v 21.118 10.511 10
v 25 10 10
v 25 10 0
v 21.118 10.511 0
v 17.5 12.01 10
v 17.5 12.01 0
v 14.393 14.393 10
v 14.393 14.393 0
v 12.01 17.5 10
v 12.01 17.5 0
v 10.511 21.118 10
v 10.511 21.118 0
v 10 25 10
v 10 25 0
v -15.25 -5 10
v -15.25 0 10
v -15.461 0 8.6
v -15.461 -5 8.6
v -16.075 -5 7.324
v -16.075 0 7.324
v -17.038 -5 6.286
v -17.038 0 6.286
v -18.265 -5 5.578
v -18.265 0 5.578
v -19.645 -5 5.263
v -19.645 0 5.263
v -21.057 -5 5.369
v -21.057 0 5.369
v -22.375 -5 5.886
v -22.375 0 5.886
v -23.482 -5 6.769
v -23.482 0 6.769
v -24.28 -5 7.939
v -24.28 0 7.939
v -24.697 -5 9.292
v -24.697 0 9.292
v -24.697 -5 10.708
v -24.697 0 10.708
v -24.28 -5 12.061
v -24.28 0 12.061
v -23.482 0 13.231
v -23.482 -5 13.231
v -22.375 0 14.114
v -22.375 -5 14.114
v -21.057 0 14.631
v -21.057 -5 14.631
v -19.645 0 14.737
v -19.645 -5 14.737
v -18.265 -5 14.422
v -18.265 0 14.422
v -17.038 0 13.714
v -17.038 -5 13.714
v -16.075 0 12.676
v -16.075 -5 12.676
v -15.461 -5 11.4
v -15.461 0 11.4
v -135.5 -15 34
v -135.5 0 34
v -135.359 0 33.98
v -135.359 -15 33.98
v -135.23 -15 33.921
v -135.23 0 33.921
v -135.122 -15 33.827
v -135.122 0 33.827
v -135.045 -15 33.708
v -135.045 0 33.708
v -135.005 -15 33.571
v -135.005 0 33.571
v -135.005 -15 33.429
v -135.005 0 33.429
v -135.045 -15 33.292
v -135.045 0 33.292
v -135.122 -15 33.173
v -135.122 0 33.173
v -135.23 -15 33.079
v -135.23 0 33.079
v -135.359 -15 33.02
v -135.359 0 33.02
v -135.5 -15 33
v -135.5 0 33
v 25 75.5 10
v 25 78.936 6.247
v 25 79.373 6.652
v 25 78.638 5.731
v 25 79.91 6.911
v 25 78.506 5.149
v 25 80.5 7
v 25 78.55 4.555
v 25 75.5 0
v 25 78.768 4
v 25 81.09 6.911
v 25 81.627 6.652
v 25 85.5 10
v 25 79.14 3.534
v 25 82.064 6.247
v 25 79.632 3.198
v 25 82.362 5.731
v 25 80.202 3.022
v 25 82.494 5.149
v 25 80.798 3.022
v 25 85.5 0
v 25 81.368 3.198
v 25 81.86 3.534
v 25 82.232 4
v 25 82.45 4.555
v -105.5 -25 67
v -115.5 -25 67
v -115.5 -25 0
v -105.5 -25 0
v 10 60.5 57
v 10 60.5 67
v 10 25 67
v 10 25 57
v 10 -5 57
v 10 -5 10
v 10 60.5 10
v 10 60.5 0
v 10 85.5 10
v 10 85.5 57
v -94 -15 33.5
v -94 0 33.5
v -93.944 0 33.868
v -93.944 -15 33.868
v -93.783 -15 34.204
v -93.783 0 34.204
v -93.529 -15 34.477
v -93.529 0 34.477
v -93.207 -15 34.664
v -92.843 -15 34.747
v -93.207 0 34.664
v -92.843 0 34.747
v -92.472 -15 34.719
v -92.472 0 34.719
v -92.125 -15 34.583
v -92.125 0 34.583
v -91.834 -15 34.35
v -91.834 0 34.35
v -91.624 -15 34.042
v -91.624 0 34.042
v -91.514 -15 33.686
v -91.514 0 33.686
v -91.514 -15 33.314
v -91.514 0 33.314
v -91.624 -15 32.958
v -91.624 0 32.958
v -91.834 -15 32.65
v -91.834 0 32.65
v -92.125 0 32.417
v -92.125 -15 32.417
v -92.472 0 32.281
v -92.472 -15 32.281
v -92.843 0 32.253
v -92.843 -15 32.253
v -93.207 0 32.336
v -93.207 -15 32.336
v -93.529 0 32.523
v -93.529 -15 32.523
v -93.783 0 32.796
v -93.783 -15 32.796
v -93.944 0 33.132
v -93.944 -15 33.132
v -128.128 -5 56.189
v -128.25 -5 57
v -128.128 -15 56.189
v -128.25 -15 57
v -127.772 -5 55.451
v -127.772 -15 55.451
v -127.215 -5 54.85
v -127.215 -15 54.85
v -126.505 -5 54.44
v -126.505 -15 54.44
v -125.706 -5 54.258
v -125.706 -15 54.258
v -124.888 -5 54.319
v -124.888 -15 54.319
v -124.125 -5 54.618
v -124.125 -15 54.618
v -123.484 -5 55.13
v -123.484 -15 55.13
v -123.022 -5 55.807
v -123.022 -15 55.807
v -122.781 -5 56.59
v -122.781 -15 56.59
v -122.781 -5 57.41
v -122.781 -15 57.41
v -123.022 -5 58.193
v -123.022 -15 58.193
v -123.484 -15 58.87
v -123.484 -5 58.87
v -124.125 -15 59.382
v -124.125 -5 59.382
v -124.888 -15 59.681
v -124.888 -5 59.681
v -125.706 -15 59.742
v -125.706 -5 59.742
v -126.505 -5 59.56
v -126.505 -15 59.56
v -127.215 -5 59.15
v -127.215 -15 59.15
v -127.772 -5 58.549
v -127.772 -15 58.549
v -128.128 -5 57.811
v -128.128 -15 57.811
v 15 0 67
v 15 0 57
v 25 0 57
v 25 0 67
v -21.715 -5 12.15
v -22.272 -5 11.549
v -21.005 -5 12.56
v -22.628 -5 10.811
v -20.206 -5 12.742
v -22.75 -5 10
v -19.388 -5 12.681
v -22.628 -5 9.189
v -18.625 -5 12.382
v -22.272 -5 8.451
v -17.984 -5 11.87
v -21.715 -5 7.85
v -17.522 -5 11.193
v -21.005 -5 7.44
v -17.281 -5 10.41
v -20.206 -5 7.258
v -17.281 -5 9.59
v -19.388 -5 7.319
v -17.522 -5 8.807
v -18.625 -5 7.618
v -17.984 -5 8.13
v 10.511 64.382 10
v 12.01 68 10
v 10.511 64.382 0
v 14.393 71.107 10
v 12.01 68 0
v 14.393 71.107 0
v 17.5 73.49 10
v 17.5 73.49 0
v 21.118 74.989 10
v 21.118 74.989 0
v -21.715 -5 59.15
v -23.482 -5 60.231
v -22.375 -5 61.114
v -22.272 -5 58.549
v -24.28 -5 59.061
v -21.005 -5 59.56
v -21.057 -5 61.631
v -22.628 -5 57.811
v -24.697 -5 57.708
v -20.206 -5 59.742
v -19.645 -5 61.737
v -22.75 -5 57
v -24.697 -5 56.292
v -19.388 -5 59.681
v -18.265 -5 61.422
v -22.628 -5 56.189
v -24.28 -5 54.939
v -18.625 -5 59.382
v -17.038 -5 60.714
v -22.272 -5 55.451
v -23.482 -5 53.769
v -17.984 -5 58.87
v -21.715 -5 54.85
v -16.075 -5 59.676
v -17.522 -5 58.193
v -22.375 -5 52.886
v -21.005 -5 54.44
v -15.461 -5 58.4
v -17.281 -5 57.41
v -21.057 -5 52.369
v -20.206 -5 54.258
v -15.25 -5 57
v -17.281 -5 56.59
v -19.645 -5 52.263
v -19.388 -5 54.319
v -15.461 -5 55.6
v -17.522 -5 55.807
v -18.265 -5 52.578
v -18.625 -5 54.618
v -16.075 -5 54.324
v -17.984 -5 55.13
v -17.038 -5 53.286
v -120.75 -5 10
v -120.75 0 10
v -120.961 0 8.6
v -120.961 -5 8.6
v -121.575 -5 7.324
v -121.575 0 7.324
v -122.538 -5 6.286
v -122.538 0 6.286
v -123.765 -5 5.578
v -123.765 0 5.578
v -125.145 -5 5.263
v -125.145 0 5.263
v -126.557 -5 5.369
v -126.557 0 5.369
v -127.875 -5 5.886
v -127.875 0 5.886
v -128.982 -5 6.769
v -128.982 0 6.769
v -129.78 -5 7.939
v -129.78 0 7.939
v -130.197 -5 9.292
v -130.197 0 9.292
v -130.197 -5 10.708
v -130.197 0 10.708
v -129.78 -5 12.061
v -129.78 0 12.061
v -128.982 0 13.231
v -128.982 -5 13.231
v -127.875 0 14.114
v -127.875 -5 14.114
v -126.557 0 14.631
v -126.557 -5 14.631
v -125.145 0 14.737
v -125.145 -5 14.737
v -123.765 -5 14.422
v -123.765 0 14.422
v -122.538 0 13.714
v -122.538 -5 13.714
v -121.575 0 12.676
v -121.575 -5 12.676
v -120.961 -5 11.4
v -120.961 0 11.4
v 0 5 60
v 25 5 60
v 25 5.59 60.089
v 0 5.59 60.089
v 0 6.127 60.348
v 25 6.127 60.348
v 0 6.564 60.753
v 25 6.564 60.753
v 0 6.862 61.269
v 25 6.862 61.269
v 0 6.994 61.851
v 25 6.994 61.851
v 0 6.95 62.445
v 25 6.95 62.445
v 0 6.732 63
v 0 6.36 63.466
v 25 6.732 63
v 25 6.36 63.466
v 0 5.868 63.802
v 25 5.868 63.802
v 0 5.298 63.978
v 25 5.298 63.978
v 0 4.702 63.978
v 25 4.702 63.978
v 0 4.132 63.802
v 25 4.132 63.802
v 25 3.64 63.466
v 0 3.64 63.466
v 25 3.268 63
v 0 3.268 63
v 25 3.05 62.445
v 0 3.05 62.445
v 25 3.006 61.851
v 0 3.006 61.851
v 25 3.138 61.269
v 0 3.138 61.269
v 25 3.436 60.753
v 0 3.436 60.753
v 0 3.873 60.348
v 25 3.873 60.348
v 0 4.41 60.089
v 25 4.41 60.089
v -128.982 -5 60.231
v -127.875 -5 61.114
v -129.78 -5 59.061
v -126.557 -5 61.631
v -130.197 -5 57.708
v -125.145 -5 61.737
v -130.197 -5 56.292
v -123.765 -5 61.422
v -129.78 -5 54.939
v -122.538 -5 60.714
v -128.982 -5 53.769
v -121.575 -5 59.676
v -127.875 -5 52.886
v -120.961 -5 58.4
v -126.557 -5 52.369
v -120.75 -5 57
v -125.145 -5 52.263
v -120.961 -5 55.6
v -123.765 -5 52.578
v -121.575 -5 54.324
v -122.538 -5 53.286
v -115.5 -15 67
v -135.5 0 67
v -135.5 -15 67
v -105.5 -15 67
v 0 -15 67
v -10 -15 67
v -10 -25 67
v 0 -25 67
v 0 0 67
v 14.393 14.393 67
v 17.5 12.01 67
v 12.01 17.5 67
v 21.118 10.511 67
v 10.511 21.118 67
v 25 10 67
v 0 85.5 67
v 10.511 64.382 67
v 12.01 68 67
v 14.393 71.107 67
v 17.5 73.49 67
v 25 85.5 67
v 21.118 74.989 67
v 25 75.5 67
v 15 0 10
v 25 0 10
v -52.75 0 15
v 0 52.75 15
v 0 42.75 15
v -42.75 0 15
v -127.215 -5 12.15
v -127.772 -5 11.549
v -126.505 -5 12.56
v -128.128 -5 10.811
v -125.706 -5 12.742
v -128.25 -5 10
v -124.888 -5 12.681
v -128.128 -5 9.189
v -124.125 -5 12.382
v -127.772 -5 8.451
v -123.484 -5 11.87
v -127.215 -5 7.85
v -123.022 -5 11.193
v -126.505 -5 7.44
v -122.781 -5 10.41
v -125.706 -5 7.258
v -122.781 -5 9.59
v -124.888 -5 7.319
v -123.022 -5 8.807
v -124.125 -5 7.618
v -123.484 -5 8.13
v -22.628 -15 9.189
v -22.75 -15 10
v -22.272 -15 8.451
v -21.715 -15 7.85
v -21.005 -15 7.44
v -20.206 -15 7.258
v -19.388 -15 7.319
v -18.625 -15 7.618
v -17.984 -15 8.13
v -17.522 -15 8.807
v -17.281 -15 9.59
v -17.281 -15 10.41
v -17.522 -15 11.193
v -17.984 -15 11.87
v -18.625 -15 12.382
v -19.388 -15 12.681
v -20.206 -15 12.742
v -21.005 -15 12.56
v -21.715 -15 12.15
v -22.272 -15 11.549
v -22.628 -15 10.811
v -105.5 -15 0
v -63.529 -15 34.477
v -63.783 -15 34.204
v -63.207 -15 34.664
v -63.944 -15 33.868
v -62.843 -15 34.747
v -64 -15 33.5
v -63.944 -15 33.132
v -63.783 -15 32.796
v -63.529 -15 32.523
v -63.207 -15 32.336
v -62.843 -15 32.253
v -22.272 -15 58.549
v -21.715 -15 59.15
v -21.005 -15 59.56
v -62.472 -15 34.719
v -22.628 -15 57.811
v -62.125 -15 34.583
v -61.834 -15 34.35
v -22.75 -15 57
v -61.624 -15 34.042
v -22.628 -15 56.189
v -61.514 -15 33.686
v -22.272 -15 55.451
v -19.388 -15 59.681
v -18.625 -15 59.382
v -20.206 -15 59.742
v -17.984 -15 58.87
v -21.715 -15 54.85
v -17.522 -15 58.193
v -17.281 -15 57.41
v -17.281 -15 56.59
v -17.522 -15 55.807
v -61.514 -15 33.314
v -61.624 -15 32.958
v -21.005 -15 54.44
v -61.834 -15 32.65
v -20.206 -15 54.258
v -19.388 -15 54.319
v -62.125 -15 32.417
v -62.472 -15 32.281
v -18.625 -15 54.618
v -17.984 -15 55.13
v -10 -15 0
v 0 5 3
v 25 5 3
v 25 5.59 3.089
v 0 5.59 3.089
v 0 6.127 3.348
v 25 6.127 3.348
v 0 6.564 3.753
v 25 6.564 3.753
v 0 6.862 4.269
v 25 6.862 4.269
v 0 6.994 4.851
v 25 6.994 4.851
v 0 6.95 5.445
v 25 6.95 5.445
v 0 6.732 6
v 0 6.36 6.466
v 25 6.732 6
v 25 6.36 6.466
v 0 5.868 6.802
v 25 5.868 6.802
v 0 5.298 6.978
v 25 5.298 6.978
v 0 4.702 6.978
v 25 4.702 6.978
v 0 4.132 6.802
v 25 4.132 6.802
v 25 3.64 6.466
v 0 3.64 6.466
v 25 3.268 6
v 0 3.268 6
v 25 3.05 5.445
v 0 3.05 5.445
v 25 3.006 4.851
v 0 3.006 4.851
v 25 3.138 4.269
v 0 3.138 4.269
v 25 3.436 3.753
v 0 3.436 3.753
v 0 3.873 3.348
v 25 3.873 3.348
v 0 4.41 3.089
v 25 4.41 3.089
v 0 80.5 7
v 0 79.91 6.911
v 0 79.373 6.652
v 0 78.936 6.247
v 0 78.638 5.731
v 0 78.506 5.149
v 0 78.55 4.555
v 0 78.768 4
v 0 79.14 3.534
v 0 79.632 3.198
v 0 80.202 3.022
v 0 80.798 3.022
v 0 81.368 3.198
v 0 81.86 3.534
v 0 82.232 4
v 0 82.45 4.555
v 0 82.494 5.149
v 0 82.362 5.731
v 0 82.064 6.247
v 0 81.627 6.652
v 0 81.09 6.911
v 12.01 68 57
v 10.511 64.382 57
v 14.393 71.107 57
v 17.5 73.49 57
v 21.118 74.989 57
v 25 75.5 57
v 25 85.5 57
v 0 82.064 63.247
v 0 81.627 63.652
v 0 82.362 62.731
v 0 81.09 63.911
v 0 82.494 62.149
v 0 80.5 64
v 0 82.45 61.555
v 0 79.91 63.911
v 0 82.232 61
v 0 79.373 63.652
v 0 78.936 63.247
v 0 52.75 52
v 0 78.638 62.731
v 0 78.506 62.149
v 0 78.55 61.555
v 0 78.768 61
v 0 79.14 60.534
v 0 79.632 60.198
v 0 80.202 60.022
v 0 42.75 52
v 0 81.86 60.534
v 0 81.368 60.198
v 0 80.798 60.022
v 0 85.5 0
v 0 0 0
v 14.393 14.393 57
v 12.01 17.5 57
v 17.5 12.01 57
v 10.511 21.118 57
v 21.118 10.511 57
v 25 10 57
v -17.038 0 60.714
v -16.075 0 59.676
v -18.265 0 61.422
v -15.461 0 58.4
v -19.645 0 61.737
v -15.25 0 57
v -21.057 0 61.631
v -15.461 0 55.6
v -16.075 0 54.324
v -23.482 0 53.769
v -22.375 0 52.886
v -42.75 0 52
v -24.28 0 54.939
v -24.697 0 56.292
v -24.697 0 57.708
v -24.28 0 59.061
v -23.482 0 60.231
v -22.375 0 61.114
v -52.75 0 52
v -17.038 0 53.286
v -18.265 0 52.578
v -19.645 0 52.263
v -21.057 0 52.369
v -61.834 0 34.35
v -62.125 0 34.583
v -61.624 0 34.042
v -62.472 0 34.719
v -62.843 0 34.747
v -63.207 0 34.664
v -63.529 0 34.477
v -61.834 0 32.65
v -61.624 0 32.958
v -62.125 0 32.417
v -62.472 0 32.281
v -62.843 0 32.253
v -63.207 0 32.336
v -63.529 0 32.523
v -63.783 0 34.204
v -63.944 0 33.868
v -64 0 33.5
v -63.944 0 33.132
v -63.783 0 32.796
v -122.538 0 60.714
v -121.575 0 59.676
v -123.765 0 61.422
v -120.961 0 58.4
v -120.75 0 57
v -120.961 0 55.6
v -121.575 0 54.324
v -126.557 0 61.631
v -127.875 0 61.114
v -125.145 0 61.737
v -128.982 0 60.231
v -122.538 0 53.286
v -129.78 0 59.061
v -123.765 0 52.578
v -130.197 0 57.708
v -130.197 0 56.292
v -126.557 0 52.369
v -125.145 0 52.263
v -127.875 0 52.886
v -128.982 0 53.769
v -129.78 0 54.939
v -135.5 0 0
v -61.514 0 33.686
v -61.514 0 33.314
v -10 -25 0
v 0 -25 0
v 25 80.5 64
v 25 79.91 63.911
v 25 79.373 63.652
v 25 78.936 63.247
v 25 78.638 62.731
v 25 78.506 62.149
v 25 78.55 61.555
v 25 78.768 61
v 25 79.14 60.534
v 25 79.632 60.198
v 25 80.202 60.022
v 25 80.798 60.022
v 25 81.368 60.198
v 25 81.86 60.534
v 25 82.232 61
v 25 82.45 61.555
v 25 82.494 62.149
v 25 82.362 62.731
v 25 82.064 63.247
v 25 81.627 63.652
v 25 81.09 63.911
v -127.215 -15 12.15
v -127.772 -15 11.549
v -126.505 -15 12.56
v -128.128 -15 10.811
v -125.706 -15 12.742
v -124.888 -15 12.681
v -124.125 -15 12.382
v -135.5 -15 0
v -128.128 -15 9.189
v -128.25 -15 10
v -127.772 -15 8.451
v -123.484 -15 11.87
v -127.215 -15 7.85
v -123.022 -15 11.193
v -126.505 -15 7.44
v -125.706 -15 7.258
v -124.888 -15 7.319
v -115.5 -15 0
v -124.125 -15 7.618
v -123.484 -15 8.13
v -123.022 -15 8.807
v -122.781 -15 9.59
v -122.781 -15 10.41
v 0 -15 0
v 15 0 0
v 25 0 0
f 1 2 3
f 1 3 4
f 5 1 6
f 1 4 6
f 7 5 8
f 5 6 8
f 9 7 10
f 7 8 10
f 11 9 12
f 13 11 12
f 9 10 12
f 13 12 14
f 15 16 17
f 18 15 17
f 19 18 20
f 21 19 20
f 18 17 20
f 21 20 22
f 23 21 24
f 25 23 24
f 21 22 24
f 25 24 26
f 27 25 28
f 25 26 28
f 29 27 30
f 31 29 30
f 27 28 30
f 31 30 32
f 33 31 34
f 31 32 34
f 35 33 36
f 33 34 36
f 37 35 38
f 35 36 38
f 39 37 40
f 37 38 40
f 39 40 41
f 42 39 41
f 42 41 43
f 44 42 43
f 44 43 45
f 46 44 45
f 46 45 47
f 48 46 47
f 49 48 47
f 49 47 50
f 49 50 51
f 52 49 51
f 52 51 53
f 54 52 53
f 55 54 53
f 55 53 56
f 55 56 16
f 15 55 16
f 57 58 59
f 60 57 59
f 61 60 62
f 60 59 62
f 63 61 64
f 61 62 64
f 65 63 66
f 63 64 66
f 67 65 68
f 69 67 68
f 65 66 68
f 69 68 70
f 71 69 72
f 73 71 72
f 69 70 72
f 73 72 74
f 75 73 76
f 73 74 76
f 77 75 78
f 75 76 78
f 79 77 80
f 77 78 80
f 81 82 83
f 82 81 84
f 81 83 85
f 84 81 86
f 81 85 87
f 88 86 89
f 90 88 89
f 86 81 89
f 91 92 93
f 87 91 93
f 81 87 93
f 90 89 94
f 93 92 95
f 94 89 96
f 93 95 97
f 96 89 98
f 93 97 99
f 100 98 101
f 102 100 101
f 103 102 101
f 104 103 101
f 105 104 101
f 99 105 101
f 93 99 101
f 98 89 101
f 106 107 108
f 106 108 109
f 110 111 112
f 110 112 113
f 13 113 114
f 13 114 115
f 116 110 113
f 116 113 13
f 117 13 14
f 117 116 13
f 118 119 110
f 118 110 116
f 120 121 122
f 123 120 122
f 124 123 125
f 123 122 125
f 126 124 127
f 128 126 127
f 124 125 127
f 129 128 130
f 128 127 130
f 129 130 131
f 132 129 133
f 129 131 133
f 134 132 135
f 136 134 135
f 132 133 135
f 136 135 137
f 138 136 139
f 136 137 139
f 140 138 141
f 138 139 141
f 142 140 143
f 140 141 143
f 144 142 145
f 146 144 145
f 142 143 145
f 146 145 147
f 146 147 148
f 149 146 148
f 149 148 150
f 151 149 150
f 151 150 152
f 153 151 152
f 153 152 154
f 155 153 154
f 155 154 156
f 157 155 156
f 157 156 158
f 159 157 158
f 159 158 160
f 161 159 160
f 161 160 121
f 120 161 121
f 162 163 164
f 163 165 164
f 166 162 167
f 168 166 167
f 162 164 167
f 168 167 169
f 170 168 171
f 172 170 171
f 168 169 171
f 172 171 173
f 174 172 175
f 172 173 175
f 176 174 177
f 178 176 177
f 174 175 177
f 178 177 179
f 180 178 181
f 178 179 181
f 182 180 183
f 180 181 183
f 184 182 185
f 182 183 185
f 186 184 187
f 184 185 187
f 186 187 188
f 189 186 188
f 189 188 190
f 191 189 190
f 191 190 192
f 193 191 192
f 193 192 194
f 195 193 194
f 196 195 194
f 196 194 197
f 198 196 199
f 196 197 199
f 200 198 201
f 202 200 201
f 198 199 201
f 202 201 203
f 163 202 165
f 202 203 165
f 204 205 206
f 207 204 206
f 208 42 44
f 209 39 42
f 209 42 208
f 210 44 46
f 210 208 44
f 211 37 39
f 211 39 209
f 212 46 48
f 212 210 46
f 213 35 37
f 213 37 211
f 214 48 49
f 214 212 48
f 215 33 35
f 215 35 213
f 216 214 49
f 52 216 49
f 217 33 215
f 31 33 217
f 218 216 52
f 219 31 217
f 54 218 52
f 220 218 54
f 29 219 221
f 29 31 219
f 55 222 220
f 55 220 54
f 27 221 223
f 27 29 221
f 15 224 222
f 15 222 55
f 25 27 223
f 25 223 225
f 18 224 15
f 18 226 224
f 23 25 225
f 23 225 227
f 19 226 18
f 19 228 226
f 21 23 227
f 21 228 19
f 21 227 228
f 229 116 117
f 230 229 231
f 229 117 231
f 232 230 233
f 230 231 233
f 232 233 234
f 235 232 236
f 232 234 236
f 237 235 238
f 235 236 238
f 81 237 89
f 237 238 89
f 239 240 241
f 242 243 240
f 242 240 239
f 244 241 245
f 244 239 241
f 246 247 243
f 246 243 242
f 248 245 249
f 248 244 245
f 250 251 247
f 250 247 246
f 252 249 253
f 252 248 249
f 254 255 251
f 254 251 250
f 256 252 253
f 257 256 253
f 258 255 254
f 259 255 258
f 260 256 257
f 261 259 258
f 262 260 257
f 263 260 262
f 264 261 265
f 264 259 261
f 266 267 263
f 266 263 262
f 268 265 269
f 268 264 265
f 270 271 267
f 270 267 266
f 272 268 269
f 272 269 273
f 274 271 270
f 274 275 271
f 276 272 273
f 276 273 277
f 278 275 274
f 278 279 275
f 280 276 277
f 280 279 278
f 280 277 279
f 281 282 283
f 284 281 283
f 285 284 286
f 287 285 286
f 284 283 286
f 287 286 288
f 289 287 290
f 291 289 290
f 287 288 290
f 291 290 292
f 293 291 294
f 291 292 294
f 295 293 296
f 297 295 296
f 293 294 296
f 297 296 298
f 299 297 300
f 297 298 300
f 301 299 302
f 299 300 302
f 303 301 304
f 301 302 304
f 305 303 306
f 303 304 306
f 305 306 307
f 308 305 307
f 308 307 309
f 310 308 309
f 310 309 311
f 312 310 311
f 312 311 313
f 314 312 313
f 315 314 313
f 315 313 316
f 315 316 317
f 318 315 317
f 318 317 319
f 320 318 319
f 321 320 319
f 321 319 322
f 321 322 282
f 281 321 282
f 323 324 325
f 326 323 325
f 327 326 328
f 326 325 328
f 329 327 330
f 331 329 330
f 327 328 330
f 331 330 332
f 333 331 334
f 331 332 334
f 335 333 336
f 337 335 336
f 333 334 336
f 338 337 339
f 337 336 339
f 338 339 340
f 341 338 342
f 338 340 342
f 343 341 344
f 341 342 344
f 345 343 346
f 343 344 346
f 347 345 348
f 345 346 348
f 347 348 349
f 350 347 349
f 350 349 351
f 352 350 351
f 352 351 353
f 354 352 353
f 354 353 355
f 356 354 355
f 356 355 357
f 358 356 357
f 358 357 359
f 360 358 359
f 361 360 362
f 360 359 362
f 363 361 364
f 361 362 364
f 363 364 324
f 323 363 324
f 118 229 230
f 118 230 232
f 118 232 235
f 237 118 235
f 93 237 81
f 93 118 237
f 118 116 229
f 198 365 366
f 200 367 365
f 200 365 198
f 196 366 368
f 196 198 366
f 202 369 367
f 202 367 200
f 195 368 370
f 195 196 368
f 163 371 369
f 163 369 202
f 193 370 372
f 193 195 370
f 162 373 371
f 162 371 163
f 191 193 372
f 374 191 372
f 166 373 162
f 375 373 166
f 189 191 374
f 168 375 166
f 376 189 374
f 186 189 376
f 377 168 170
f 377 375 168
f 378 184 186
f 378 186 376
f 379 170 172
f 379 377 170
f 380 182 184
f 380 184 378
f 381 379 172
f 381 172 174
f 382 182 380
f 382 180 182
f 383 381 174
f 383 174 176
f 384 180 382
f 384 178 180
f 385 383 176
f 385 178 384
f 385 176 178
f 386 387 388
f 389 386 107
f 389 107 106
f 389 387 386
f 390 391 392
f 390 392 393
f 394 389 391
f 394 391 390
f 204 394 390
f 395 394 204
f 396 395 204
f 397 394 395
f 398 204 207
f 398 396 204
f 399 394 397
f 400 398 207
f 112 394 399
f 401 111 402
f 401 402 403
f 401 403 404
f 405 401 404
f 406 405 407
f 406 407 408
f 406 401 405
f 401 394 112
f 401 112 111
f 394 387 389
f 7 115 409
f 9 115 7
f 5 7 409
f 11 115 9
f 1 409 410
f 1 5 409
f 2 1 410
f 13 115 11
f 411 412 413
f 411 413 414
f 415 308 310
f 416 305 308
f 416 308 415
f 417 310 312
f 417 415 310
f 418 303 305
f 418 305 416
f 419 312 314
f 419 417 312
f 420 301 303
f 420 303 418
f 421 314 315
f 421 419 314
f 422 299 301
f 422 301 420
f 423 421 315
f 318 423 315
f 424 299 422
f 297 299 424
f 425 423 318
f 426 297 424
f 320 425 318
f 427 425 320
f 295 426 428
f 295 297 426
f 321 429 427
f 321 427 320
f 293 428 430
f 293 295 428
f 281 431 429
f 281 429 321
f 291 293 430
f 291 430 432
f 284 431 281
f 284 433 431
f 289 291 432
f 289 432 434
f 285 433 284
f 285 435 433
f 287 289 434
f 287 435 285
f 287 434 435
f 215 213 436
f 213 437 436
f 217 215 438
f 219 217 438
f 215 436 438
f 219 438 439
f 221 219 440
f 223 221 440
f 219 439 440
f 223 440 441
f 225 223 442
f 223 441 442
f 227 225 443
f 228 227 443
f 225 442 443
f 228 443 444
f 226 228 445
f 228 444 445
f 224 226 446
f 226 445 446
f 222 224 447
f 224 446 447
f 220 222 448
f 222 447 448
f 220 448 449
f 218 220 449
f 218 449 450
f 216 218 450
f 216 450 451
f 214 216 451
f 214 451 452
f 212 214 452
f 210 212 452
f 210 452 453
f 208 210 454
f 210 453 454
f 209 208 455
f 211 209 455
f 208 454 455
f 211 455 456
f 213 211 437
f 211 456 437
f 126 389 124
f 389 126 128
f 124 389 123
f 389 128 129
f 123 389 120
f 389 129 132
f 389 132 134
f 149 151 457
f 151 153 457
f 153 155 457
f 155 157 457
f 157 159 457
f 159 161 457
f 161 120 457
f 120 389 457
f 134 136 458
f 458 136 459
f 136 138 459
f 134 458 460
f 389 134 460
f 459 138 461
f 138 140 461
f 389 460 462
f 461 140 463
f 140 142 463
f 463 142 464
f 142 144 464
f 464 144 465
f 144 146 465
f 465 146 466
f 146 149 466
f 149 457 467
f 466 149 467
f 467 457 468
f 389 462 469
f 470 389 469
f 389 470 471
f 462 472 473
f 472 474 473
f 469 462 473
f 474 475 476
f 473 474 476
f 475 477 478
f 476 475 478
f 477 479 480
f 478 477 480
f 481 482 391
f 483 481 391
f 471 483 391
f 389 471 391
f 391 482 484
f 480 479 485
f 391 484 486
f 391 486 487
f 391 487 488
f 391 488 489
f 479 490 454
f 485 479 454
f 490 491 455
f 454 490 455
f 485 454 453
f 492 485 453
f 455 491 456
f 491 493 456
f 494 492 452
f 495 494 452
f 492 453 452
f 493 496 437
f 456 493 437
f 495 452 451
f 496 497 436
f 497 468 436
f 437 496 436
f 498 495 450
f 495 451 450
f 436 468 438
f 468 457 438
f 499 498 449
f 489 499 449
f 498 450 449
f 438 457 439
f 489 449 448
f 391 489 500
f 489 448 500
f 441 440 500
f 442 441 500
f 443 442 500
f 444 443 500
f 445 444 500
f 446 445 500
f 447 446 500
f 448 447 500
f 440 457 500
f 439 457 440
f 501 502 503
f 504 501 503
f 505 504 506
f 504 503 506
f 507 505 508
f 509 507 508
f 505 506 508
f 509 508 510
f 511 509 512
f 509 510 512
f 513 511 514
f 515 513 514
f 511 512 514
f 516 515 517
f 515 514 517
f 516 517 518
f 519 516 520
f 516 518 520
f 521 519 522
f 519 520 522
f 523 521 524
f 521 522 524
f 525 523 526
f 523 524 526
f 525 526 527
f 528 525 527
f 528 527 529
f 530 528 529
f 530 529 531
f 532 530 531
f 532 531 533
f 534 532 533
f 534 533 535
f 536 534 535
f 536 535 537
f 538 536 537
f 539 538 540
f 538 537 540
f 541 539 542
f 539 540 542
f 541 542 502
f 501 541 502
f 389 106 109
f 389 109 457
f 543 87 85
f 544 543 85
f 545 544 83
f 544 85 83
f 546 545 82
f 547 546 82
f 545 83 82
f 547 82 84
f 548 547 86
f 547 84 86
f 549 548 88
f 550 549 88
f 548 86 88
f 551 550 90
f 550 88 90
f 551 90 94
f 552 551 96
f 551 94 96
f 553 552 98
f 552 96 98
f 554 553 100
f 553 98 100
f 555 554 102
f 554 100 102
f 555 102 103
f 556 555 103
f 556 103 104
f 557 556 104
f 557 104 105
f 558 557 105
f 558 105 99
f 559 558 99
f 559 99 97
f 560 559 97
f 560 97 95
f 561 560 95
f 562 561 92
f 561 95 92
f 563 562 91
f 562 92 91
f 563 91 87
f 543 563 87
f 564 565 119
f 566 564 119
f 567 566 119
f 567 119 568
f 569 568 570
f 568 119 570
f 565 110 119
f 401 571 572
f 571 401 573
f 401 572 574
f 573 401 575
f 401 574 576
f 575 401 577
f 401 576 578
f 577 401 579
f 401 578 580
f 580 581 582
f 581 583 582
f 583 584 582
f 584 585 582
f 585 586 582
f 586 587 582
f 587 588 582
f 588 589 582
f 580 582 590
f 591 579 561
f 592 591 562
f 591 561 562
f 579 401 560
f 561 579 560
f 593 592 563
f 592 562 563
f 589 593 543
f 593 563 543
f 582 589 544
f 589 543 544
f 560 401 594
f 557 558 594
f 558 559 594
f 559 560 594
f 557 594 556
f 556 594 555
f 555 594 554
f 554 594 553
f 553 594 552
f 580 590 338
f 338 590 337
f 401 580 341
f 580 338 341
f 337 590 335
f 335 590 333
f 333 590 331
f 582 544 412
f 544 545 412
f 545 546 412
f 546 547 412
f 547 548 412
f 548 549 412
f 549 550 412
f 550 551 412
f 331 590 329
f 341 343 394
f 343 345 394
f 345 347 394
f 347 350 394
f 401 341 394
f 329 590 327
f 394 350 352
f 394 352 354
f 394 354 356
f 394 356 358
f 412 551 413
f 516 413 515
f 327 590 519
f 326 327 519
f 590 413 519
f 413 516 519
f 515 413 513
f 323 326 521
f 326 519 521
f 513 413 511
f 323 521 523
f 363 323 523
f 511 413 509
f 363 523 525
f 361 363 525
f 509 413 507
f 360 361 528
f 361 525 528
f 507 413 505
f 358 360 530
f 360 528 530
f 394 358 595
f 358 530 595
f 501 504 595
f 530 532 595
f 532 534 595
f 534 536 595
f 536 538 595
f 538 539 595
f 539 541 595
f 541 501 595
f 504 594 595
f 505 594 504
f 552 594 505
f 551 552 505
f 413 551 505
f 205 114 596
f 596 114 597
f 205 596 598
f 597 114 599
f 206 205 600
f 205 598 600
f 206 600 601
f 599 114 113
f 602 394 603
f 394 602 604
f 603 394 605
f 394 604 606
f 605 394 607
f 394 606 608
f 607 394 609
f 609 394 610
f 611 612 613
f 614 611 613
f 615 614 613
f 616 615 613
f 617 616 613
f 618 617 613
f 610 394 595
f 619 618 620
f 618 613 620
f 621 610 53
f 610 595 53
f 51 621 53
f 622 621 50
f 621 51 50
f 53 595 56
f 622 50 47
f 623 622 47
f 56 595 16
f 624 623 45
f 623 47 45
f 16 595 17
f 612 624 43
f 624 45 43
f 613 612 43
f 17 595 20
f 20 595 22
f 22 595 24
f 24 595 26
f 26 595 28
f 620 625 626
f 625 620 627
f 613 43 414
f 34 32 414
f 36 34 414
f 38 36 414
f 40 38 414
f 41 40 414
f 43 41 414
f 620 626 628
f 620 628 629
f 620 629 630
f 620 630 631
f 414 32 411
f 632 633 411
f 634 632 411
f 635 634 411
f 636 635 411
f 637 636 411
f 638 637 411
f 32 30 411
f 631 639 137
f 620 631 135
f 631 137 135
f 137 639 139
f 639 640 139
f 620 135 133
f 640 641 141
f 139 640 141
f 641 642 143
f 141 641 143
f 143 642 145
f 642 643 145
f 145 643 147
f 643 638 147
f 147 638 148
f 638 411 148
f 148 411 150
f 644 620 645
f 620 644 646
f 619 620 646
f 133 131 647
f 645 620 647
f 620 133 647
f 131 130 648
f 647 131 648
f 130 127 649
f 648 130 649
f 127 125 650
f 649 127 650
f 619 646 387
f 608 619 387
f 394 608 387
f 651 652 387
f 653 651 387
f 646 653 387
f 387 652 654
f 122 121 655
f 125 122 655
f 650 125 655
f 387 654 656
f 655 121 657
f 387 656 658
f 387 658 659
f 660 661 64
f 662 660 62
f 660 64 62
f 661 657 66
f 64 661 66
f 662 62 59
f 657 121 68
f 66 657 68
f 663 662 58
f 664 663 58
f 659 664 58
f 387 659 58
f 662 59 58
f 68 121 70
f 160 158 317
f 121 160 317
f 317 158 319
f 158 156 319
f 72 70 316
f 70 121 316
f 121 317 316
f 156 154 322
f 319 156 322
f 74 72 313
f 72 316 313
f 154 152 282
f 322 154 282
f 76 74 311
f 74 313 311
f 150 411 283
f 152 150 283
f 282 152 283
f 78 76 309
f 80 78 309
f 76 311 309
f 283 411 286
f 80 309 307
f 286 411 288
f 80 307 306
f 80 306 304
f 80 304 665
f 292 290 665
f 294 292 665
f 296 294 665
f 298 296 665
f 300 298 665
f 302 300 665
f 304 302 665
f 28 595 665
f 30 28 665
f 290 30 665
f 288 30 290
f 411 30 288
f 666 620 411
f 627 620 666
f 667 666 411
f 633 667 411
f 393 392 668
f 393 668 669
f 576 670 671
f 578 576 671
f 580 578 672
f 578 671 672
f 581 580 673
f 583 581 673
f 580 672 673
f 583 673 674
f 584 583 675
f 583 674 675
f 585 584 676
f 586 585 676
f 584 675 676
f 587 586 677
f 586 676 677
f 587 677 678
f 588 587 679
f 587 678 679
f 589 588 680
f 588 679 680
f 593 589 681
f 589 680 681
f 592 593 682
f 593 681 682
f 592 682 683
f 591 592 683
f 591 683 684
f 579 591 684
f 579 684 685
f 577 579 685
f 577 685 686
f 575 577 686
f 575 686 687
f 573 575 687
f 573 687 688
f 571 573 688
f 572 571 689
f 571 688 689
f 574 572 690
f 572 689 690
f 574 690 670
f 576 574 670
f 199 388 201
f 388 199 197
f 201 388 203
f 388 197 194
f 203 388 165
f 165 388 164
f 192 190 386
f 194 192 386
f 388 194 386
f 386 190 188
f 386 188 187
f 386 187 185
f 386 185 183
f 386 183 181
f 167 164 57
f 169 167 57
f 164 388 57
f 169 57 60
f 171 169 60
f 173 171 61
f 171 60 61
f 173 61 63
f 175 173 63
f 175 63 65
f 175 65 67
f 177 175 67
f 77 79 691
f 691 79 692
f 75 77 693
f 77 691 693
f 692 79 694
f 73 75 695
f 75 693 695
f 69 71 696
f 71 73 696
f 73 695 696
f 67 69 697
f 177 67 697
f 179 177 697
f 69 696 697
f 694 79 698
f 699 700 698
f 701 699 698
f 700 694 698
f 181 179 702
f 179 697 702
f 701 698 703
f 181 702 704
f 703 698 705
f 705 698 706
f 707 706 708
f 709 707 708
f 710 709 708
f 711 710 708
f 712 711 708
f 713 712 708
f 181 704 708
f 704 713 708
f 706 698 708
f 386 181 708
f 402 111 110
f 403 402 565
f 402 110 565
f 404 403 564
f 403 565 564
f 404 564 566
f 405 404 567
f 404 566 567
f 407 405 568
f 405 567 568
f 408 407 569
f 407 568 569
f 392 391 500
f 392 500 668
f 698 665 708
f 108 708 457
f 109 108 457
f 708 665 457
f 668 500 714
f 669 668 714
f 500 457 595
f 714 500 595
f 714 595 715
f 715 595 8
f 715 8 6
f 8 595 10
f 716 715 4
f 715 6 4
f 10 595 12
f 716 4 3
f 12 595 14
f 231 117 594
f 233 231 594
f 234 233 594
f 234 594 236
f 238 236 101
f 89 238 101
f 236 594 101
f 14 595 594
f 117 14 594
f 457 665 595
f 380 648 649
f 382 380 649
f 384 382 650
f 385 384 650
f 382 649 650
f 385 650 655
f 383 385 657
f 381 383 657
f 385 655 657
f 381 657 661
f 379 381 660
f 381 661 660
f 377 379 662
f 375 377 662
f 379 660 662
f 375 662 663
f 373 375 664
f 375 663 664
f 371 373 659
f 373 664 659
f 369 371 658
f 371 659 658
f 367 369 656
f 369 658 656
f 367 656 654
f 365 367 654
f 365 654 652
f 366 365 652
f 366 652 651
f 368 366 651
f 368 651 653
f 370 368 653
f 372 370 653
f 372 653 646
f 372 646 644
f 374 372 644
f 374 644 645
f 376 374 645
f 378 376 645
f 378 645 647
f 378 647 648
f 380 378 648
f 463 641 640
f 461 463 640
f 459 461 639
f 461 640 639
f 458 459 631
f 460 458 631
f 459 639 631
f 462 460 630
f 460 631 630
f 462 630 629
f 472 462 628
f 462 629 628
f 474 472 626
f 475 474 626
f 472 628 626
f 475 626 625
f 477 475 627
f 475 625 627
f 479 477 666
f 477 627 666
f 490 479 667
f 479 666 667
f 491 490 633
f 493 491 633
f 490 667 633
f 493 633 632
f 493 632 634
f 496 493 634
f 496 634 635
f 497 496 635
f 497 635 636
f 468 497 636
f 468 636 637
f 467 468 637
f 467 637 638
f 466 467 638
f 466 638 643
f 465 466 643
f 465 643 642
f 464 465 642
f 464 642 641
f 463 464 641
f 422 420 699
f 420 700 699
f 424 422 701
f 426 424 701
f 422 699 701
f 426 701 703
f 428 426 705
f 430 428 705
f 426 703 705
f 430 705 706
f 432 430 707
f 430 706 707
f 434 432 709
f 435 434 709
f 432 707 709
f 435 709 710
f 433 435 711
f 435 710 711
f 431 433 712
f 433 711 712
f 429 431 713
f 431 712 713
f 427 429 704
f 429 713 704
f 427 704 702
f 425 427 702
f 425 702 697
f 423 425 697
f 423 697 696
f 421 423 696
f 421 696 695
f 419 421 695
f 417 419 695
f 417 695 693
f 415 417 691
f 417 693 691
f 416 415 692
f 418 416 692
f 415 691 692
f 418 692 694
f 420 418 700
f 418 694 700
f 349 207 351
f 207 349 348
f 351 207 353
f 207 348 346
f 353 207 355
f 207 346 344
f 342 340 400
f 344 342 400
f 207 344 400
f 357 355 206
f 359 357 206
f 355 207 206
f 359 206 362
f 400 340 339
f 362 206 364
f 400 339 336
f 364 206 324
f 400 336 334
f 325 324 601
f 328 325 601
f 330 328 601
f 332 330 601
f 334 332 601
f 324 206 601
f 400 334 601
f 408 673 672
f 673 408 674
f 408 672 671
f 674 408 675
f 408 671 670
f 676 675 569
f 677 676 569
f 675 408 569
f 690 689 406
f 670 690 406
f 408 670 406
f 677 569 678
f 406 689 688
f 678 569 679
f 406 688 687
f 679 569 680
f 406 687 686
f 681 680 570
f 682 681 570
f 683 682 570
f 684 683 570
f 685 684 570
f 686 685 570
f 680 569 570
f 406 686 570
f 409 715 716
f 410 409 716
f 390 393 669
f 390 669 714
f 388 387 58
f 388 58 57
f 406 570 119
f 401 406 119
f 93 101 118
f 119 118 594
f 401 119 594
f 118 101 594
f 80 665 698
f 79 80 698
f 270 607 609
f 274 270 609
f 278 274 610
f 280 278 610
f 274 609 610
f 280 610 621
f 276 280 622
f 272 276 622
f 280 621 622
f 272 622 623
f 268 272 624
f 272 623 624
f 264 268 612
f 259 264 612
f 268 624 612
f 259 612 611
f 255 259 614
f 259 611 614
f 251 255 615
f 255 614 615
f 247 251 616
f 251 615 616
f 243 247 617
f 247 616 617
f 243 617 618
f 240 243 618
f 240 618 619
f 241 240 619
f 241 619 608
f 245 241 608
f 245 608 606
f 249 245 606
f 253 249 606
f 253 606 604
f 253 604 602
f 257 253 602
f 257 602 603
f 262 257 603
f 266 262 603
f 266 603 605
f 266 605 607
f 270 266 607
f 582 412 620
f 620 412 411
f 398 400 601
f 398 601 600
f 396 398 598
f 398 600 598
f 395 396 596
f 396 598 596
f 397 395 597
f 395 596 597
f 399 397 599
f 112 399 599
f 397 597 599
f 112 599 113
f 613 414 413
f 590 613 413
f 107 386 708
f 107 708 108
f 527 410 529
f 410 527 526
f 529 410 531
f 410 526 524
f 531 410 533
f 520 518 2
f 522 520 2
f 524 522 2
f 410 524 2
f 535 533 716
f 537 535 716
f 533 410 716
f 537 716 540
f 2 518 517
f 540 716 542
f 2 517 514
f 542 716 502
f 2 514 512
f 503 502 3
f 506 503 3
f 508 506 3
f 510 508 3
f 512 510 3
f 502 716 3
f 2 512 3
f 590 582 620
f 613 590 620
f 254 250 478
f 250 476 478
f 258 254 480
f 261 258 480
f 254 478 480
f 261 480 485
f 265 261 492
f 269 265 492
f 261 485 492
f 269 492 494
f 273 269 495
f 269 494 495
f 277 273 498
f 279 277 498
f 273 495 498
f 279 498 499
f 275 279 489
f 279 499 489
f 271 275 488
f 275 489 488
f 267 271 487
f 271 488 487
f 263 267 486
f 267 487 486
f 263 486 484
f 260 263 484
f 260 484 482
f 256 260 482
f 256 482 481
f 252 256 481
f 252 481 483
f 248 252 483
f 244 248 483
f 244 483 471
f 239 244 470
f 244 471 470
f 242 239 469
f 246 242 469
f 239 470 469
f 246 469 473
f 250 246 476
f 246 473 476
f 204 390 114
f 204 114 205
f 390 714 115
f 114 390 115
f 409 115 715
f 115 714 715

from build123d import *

# Parameters (mm, degrees)
EXTRUDE_2_DEPTH              = 67
CUT_EXTRUDE_5_DEPTH          = 15
CUT_EXTRUDE_6_DEPTH          = 15
SKETCH_4_W                   = 15
SKETCH_4_H                   = 47
CUT_EXTRUDE_7_DEPTH          = 100
CUT_EXTRUDE_8_DEPTH          = 100
CUT_EXTRUDE_11_DEPTH         = 25
CUT_EXTRUDE_12_DEPTH         = 25
CUT_EXTRUDE_13_DEPTH         = 25
CUT_EXTRUDE_14_DEPTH         = 25
HOLE_WIZARD_M5_1_D           = 5.5
HOLE_WIZARD_M5_1_CBORE_D     = 9.5
HOLE_WIZARD_M5_1_CBORE_DEPTH = 5
SKETCH_24_R                  = 1.25
CUT_EXTRUDE_15_DEPTH         = 50
SKETCH_25_W                  = 20
SKETCH_25_H                  = 10
CUT_EXTRUDE_16_DEPTH         = 100


with BuildPart() as part:
    # 스케치1 → 보스-돌출2 (new body)
    with BuildSketch(Plane.XY):
        with BuildLine():
            Line((0, 85.5), (0, 52.75))
            Line((0, 52.75), (-52.75, 0))
            Line((-52.75, 0), (-135.5, 0))
            Line((-135.5, 0), (-135.5, -15))
            Line((-135.5, -15), (-115.5, -15))
            Line((-115.5, -15), (-115.5, -25))
            Line((-115.5, -25), (-85.5, -25))
            Line((-85.5, -25), (-85.5, -15))
            Line((-85.5, -15), (-10, -15))
            Line((-10, -15), (-10, -25))
            Line((-10, -25), (0, -25))
            Line((0, -25), (0, -15))
            Line((0, -15), (15, 0))
            Line((15, 0), (25, 0))
            Line((25, 0), (25, 10))
            ThreePointArc((25, 10), (14.393398282, 14.393398282), (10, 25))
            Line((10, 25), (10, 60.5))
            ThreePointArc((10, 60.5), (14.393398282, 71.106601718), (25, 75.5))
            Line((25, 75.5), (25, 85.5))
            Line((25, 85.5), (0, 85.5))
        make_face()
        Polygon((-42.75, 0), (0, 42.75), (0, 0), align=None, mode=Mode.SUBTRACT)
    extrude(amount=EXTRUDE_2_DEPTH)

    # 스케치2 → 컷-돌출5 (cut)
    with BuildSketch(Plane.XY.offset(67)):
        Polygon((0, 52.75), (0, 42.75), (-42.75, 0), (-52.75, 0), align=None)
    extrude(amount=-CUT_EXTRUDE_5_DEPTH, mode=Mode.SUBTRACT)

    # 스케치3 → 컷-돌출6 (cut)
    with BuildSketch(Plane(origin=(0, 0, 0), x_dir=(-1, 0, 0), z_dir=(0, 0, -1))):
        Polygon((0, 52.75), (0, 42.75), (42.75, 0), (52.75, 0), align=None)
    extrude(amount=-CUT_EXTRUDE_6_DEPTH, mode=Mode.SUBTRACT)

    # 스케치4 → 컷-돌출7 (cut)
    with BuildSketch(Plane(origin=(0, 85.5, 0), x_dir=(1, 0, 0), z_dir=(0, 1, 0))):
        with Locations((17.5, -33.5)):
            Rectangle(SKETCH_4_W, SKETCH_4_H)
    extrude(amount=-CUT_EXTRUDE_7_DEPTH, mode=Mode.SUBTRACT)

    # 스케치5 → 컷-돌출8 (cut)
    with BuildSketch(Plane(origin=(0, 0, 0), x_dir=(1, 0, 0), z_dir=(0, 1, 0))):
        with BuildLine():
            ThreePointArc((-135.5, -34), (-135, -33.5), (-135.5, -33))
            Line((-135.5, -33), (-135.5, -33.5))
            Line((-135.5, -33.5), (-135.5, -34))
        make_face()
    extrude(amount=-CUT_EXTRUDE_8_DEPTH, mode=Mode.SUBTRACT)

    # 스케치8 → 컷-돌출11 (cut)
    with BuildSketch(Plane(origin=(25, 0, 0), x_dir=(0, 0, -1), z_dir=(1, 0, 0))):
        with BuildLine():
            ThreePointArc((-60, 80.5), (-62, 82.5), (-64, 80.5))
            Line((-64, 80.5), (-60, 80.5))
        make_face()
        with BuildLine():
            Line((-60, 80.5), (-64, 80.5))
            ThreePointArc((-64, 80.5), (-62, 78.5), (-60, 80.5))
        make_face()
    extrude(amount=-CUT_EXTRUDE_11_DEPTH, mode=Mode.SUBTRACT)

    # 스케치10 → 컷-돌출12 (cut)
    with BuildSketch(Plane(origin=(25, 0, 0), x_dir=(0, 0, -1), z_dir=(1, 0, 0))):
        with BuildLine():
            ThreePointArc((-3, 80.5), (-5, 82.5), (-7, 80.5))
            Line((-7, 80.5), (-3, 80.5))
        make_face()
        with BuildLine():
            Line((-3, 80.5), (-7, 80.5))
            ThreePointArc((-7, 80.5), (-5, 78.5), (-3, 80.5))
        make_face()
    extrude(amount=-CUT_EXTRUDE_12_DEPTH, mode=Mode.SUBTRACT)

    # 스케치11 → 컷-돌출13 (cut)
    with BuildSketch(Plane(origin=(25, 0, 0), x_dir=(0, 0, -1), z_dir=(1, 0, 0))):
        with BuildLine():
            ThreePointArc((-64, 5), (-62, 3), (-60, 5))
            Line((-60, 5), (-64, 5))
        make_face()
        with BuildLine():
            Line((-64, 5), (-60, 5))
            ThreePointArc((-60, 5), (-62, 7), (-64, 5))
        make_face()
    extrude(amount=-CUT_EXTRUDE_13_DEPTH, mode=Mode.SUBTRACT)

    # 스케치12 → 컷-돌출14 (cut)
    with BuildSketch(Plane(origin=(25, 0, 0), x_dir=(0, 0, -1), z_dir=(1, 0, 0))):
        with BuildLine():
            ThreePointArc((-7, 5), (-5, 3), (-3, 5))
            Line((-3, 5), (-7, 5))
        make_face()
        with BuildLine():
            Line((-7, 5), (-3, 5))
            ThreePointArc((-3, 5), (-5, 7), (-7, 5))
        make_face()
    extrude(amount=-CUT_EXTRUDE_14_DEPTH, mode=Mode.SUBTRACT)

    # M5 소켓 머리 캡 나사용 카운터보어1 (through all)
    with Locations(Plane(origin=(0, 0, 0), x_dir=(1, 0, 0), z_dir=(0, 1, 0))):
        with Locations((-125.5, -10), (-125.5, -57), (-20, -10), (-20, -57)):
            CounterBoreHole(HOLE_WIZARD_M5_1_D / 2, HOLE_WIZARD_M5_1_CBORE_D / 2, HOLE_WIZARD_M5_1_CBORE_DEPTH)

    # 스케치24 → 컷-돌출15 (cut)
    with BuildSketch(Plane(origin=(0, 0, 0), x_dir=(1, 0, 0), z_dir=(0, 1, 0))):
        with Locations(Location((-62.75, -33.5, 0), (0, 0, 180))):
            Circle(SKETCH_24_R)
        with Locations(Location((-92.75, -33.5, 0), (0, 0, 180))):
            Circle(SKETCH_24_R)
    extrude(amount=-CUT_EXTRUDE_15_DEPTH, mode=Mode.SUBTRACT)

    # 스케치25 → 컷-돌출16 (cut)
    with BuildSketch(Plane(origin=(0, 0, 0), x_dir=(-1, 0, 0), z_dir=(0, 0, -1))):
        with Locations((95.5, -20)):
            Rectangle(SKETCH_25_W, SKETCH_25_H)
    extrude(amount=-CUT_EXTRUDE_16_DEPTH, mode=Mode.SUBTRACT)


solid = part.part
